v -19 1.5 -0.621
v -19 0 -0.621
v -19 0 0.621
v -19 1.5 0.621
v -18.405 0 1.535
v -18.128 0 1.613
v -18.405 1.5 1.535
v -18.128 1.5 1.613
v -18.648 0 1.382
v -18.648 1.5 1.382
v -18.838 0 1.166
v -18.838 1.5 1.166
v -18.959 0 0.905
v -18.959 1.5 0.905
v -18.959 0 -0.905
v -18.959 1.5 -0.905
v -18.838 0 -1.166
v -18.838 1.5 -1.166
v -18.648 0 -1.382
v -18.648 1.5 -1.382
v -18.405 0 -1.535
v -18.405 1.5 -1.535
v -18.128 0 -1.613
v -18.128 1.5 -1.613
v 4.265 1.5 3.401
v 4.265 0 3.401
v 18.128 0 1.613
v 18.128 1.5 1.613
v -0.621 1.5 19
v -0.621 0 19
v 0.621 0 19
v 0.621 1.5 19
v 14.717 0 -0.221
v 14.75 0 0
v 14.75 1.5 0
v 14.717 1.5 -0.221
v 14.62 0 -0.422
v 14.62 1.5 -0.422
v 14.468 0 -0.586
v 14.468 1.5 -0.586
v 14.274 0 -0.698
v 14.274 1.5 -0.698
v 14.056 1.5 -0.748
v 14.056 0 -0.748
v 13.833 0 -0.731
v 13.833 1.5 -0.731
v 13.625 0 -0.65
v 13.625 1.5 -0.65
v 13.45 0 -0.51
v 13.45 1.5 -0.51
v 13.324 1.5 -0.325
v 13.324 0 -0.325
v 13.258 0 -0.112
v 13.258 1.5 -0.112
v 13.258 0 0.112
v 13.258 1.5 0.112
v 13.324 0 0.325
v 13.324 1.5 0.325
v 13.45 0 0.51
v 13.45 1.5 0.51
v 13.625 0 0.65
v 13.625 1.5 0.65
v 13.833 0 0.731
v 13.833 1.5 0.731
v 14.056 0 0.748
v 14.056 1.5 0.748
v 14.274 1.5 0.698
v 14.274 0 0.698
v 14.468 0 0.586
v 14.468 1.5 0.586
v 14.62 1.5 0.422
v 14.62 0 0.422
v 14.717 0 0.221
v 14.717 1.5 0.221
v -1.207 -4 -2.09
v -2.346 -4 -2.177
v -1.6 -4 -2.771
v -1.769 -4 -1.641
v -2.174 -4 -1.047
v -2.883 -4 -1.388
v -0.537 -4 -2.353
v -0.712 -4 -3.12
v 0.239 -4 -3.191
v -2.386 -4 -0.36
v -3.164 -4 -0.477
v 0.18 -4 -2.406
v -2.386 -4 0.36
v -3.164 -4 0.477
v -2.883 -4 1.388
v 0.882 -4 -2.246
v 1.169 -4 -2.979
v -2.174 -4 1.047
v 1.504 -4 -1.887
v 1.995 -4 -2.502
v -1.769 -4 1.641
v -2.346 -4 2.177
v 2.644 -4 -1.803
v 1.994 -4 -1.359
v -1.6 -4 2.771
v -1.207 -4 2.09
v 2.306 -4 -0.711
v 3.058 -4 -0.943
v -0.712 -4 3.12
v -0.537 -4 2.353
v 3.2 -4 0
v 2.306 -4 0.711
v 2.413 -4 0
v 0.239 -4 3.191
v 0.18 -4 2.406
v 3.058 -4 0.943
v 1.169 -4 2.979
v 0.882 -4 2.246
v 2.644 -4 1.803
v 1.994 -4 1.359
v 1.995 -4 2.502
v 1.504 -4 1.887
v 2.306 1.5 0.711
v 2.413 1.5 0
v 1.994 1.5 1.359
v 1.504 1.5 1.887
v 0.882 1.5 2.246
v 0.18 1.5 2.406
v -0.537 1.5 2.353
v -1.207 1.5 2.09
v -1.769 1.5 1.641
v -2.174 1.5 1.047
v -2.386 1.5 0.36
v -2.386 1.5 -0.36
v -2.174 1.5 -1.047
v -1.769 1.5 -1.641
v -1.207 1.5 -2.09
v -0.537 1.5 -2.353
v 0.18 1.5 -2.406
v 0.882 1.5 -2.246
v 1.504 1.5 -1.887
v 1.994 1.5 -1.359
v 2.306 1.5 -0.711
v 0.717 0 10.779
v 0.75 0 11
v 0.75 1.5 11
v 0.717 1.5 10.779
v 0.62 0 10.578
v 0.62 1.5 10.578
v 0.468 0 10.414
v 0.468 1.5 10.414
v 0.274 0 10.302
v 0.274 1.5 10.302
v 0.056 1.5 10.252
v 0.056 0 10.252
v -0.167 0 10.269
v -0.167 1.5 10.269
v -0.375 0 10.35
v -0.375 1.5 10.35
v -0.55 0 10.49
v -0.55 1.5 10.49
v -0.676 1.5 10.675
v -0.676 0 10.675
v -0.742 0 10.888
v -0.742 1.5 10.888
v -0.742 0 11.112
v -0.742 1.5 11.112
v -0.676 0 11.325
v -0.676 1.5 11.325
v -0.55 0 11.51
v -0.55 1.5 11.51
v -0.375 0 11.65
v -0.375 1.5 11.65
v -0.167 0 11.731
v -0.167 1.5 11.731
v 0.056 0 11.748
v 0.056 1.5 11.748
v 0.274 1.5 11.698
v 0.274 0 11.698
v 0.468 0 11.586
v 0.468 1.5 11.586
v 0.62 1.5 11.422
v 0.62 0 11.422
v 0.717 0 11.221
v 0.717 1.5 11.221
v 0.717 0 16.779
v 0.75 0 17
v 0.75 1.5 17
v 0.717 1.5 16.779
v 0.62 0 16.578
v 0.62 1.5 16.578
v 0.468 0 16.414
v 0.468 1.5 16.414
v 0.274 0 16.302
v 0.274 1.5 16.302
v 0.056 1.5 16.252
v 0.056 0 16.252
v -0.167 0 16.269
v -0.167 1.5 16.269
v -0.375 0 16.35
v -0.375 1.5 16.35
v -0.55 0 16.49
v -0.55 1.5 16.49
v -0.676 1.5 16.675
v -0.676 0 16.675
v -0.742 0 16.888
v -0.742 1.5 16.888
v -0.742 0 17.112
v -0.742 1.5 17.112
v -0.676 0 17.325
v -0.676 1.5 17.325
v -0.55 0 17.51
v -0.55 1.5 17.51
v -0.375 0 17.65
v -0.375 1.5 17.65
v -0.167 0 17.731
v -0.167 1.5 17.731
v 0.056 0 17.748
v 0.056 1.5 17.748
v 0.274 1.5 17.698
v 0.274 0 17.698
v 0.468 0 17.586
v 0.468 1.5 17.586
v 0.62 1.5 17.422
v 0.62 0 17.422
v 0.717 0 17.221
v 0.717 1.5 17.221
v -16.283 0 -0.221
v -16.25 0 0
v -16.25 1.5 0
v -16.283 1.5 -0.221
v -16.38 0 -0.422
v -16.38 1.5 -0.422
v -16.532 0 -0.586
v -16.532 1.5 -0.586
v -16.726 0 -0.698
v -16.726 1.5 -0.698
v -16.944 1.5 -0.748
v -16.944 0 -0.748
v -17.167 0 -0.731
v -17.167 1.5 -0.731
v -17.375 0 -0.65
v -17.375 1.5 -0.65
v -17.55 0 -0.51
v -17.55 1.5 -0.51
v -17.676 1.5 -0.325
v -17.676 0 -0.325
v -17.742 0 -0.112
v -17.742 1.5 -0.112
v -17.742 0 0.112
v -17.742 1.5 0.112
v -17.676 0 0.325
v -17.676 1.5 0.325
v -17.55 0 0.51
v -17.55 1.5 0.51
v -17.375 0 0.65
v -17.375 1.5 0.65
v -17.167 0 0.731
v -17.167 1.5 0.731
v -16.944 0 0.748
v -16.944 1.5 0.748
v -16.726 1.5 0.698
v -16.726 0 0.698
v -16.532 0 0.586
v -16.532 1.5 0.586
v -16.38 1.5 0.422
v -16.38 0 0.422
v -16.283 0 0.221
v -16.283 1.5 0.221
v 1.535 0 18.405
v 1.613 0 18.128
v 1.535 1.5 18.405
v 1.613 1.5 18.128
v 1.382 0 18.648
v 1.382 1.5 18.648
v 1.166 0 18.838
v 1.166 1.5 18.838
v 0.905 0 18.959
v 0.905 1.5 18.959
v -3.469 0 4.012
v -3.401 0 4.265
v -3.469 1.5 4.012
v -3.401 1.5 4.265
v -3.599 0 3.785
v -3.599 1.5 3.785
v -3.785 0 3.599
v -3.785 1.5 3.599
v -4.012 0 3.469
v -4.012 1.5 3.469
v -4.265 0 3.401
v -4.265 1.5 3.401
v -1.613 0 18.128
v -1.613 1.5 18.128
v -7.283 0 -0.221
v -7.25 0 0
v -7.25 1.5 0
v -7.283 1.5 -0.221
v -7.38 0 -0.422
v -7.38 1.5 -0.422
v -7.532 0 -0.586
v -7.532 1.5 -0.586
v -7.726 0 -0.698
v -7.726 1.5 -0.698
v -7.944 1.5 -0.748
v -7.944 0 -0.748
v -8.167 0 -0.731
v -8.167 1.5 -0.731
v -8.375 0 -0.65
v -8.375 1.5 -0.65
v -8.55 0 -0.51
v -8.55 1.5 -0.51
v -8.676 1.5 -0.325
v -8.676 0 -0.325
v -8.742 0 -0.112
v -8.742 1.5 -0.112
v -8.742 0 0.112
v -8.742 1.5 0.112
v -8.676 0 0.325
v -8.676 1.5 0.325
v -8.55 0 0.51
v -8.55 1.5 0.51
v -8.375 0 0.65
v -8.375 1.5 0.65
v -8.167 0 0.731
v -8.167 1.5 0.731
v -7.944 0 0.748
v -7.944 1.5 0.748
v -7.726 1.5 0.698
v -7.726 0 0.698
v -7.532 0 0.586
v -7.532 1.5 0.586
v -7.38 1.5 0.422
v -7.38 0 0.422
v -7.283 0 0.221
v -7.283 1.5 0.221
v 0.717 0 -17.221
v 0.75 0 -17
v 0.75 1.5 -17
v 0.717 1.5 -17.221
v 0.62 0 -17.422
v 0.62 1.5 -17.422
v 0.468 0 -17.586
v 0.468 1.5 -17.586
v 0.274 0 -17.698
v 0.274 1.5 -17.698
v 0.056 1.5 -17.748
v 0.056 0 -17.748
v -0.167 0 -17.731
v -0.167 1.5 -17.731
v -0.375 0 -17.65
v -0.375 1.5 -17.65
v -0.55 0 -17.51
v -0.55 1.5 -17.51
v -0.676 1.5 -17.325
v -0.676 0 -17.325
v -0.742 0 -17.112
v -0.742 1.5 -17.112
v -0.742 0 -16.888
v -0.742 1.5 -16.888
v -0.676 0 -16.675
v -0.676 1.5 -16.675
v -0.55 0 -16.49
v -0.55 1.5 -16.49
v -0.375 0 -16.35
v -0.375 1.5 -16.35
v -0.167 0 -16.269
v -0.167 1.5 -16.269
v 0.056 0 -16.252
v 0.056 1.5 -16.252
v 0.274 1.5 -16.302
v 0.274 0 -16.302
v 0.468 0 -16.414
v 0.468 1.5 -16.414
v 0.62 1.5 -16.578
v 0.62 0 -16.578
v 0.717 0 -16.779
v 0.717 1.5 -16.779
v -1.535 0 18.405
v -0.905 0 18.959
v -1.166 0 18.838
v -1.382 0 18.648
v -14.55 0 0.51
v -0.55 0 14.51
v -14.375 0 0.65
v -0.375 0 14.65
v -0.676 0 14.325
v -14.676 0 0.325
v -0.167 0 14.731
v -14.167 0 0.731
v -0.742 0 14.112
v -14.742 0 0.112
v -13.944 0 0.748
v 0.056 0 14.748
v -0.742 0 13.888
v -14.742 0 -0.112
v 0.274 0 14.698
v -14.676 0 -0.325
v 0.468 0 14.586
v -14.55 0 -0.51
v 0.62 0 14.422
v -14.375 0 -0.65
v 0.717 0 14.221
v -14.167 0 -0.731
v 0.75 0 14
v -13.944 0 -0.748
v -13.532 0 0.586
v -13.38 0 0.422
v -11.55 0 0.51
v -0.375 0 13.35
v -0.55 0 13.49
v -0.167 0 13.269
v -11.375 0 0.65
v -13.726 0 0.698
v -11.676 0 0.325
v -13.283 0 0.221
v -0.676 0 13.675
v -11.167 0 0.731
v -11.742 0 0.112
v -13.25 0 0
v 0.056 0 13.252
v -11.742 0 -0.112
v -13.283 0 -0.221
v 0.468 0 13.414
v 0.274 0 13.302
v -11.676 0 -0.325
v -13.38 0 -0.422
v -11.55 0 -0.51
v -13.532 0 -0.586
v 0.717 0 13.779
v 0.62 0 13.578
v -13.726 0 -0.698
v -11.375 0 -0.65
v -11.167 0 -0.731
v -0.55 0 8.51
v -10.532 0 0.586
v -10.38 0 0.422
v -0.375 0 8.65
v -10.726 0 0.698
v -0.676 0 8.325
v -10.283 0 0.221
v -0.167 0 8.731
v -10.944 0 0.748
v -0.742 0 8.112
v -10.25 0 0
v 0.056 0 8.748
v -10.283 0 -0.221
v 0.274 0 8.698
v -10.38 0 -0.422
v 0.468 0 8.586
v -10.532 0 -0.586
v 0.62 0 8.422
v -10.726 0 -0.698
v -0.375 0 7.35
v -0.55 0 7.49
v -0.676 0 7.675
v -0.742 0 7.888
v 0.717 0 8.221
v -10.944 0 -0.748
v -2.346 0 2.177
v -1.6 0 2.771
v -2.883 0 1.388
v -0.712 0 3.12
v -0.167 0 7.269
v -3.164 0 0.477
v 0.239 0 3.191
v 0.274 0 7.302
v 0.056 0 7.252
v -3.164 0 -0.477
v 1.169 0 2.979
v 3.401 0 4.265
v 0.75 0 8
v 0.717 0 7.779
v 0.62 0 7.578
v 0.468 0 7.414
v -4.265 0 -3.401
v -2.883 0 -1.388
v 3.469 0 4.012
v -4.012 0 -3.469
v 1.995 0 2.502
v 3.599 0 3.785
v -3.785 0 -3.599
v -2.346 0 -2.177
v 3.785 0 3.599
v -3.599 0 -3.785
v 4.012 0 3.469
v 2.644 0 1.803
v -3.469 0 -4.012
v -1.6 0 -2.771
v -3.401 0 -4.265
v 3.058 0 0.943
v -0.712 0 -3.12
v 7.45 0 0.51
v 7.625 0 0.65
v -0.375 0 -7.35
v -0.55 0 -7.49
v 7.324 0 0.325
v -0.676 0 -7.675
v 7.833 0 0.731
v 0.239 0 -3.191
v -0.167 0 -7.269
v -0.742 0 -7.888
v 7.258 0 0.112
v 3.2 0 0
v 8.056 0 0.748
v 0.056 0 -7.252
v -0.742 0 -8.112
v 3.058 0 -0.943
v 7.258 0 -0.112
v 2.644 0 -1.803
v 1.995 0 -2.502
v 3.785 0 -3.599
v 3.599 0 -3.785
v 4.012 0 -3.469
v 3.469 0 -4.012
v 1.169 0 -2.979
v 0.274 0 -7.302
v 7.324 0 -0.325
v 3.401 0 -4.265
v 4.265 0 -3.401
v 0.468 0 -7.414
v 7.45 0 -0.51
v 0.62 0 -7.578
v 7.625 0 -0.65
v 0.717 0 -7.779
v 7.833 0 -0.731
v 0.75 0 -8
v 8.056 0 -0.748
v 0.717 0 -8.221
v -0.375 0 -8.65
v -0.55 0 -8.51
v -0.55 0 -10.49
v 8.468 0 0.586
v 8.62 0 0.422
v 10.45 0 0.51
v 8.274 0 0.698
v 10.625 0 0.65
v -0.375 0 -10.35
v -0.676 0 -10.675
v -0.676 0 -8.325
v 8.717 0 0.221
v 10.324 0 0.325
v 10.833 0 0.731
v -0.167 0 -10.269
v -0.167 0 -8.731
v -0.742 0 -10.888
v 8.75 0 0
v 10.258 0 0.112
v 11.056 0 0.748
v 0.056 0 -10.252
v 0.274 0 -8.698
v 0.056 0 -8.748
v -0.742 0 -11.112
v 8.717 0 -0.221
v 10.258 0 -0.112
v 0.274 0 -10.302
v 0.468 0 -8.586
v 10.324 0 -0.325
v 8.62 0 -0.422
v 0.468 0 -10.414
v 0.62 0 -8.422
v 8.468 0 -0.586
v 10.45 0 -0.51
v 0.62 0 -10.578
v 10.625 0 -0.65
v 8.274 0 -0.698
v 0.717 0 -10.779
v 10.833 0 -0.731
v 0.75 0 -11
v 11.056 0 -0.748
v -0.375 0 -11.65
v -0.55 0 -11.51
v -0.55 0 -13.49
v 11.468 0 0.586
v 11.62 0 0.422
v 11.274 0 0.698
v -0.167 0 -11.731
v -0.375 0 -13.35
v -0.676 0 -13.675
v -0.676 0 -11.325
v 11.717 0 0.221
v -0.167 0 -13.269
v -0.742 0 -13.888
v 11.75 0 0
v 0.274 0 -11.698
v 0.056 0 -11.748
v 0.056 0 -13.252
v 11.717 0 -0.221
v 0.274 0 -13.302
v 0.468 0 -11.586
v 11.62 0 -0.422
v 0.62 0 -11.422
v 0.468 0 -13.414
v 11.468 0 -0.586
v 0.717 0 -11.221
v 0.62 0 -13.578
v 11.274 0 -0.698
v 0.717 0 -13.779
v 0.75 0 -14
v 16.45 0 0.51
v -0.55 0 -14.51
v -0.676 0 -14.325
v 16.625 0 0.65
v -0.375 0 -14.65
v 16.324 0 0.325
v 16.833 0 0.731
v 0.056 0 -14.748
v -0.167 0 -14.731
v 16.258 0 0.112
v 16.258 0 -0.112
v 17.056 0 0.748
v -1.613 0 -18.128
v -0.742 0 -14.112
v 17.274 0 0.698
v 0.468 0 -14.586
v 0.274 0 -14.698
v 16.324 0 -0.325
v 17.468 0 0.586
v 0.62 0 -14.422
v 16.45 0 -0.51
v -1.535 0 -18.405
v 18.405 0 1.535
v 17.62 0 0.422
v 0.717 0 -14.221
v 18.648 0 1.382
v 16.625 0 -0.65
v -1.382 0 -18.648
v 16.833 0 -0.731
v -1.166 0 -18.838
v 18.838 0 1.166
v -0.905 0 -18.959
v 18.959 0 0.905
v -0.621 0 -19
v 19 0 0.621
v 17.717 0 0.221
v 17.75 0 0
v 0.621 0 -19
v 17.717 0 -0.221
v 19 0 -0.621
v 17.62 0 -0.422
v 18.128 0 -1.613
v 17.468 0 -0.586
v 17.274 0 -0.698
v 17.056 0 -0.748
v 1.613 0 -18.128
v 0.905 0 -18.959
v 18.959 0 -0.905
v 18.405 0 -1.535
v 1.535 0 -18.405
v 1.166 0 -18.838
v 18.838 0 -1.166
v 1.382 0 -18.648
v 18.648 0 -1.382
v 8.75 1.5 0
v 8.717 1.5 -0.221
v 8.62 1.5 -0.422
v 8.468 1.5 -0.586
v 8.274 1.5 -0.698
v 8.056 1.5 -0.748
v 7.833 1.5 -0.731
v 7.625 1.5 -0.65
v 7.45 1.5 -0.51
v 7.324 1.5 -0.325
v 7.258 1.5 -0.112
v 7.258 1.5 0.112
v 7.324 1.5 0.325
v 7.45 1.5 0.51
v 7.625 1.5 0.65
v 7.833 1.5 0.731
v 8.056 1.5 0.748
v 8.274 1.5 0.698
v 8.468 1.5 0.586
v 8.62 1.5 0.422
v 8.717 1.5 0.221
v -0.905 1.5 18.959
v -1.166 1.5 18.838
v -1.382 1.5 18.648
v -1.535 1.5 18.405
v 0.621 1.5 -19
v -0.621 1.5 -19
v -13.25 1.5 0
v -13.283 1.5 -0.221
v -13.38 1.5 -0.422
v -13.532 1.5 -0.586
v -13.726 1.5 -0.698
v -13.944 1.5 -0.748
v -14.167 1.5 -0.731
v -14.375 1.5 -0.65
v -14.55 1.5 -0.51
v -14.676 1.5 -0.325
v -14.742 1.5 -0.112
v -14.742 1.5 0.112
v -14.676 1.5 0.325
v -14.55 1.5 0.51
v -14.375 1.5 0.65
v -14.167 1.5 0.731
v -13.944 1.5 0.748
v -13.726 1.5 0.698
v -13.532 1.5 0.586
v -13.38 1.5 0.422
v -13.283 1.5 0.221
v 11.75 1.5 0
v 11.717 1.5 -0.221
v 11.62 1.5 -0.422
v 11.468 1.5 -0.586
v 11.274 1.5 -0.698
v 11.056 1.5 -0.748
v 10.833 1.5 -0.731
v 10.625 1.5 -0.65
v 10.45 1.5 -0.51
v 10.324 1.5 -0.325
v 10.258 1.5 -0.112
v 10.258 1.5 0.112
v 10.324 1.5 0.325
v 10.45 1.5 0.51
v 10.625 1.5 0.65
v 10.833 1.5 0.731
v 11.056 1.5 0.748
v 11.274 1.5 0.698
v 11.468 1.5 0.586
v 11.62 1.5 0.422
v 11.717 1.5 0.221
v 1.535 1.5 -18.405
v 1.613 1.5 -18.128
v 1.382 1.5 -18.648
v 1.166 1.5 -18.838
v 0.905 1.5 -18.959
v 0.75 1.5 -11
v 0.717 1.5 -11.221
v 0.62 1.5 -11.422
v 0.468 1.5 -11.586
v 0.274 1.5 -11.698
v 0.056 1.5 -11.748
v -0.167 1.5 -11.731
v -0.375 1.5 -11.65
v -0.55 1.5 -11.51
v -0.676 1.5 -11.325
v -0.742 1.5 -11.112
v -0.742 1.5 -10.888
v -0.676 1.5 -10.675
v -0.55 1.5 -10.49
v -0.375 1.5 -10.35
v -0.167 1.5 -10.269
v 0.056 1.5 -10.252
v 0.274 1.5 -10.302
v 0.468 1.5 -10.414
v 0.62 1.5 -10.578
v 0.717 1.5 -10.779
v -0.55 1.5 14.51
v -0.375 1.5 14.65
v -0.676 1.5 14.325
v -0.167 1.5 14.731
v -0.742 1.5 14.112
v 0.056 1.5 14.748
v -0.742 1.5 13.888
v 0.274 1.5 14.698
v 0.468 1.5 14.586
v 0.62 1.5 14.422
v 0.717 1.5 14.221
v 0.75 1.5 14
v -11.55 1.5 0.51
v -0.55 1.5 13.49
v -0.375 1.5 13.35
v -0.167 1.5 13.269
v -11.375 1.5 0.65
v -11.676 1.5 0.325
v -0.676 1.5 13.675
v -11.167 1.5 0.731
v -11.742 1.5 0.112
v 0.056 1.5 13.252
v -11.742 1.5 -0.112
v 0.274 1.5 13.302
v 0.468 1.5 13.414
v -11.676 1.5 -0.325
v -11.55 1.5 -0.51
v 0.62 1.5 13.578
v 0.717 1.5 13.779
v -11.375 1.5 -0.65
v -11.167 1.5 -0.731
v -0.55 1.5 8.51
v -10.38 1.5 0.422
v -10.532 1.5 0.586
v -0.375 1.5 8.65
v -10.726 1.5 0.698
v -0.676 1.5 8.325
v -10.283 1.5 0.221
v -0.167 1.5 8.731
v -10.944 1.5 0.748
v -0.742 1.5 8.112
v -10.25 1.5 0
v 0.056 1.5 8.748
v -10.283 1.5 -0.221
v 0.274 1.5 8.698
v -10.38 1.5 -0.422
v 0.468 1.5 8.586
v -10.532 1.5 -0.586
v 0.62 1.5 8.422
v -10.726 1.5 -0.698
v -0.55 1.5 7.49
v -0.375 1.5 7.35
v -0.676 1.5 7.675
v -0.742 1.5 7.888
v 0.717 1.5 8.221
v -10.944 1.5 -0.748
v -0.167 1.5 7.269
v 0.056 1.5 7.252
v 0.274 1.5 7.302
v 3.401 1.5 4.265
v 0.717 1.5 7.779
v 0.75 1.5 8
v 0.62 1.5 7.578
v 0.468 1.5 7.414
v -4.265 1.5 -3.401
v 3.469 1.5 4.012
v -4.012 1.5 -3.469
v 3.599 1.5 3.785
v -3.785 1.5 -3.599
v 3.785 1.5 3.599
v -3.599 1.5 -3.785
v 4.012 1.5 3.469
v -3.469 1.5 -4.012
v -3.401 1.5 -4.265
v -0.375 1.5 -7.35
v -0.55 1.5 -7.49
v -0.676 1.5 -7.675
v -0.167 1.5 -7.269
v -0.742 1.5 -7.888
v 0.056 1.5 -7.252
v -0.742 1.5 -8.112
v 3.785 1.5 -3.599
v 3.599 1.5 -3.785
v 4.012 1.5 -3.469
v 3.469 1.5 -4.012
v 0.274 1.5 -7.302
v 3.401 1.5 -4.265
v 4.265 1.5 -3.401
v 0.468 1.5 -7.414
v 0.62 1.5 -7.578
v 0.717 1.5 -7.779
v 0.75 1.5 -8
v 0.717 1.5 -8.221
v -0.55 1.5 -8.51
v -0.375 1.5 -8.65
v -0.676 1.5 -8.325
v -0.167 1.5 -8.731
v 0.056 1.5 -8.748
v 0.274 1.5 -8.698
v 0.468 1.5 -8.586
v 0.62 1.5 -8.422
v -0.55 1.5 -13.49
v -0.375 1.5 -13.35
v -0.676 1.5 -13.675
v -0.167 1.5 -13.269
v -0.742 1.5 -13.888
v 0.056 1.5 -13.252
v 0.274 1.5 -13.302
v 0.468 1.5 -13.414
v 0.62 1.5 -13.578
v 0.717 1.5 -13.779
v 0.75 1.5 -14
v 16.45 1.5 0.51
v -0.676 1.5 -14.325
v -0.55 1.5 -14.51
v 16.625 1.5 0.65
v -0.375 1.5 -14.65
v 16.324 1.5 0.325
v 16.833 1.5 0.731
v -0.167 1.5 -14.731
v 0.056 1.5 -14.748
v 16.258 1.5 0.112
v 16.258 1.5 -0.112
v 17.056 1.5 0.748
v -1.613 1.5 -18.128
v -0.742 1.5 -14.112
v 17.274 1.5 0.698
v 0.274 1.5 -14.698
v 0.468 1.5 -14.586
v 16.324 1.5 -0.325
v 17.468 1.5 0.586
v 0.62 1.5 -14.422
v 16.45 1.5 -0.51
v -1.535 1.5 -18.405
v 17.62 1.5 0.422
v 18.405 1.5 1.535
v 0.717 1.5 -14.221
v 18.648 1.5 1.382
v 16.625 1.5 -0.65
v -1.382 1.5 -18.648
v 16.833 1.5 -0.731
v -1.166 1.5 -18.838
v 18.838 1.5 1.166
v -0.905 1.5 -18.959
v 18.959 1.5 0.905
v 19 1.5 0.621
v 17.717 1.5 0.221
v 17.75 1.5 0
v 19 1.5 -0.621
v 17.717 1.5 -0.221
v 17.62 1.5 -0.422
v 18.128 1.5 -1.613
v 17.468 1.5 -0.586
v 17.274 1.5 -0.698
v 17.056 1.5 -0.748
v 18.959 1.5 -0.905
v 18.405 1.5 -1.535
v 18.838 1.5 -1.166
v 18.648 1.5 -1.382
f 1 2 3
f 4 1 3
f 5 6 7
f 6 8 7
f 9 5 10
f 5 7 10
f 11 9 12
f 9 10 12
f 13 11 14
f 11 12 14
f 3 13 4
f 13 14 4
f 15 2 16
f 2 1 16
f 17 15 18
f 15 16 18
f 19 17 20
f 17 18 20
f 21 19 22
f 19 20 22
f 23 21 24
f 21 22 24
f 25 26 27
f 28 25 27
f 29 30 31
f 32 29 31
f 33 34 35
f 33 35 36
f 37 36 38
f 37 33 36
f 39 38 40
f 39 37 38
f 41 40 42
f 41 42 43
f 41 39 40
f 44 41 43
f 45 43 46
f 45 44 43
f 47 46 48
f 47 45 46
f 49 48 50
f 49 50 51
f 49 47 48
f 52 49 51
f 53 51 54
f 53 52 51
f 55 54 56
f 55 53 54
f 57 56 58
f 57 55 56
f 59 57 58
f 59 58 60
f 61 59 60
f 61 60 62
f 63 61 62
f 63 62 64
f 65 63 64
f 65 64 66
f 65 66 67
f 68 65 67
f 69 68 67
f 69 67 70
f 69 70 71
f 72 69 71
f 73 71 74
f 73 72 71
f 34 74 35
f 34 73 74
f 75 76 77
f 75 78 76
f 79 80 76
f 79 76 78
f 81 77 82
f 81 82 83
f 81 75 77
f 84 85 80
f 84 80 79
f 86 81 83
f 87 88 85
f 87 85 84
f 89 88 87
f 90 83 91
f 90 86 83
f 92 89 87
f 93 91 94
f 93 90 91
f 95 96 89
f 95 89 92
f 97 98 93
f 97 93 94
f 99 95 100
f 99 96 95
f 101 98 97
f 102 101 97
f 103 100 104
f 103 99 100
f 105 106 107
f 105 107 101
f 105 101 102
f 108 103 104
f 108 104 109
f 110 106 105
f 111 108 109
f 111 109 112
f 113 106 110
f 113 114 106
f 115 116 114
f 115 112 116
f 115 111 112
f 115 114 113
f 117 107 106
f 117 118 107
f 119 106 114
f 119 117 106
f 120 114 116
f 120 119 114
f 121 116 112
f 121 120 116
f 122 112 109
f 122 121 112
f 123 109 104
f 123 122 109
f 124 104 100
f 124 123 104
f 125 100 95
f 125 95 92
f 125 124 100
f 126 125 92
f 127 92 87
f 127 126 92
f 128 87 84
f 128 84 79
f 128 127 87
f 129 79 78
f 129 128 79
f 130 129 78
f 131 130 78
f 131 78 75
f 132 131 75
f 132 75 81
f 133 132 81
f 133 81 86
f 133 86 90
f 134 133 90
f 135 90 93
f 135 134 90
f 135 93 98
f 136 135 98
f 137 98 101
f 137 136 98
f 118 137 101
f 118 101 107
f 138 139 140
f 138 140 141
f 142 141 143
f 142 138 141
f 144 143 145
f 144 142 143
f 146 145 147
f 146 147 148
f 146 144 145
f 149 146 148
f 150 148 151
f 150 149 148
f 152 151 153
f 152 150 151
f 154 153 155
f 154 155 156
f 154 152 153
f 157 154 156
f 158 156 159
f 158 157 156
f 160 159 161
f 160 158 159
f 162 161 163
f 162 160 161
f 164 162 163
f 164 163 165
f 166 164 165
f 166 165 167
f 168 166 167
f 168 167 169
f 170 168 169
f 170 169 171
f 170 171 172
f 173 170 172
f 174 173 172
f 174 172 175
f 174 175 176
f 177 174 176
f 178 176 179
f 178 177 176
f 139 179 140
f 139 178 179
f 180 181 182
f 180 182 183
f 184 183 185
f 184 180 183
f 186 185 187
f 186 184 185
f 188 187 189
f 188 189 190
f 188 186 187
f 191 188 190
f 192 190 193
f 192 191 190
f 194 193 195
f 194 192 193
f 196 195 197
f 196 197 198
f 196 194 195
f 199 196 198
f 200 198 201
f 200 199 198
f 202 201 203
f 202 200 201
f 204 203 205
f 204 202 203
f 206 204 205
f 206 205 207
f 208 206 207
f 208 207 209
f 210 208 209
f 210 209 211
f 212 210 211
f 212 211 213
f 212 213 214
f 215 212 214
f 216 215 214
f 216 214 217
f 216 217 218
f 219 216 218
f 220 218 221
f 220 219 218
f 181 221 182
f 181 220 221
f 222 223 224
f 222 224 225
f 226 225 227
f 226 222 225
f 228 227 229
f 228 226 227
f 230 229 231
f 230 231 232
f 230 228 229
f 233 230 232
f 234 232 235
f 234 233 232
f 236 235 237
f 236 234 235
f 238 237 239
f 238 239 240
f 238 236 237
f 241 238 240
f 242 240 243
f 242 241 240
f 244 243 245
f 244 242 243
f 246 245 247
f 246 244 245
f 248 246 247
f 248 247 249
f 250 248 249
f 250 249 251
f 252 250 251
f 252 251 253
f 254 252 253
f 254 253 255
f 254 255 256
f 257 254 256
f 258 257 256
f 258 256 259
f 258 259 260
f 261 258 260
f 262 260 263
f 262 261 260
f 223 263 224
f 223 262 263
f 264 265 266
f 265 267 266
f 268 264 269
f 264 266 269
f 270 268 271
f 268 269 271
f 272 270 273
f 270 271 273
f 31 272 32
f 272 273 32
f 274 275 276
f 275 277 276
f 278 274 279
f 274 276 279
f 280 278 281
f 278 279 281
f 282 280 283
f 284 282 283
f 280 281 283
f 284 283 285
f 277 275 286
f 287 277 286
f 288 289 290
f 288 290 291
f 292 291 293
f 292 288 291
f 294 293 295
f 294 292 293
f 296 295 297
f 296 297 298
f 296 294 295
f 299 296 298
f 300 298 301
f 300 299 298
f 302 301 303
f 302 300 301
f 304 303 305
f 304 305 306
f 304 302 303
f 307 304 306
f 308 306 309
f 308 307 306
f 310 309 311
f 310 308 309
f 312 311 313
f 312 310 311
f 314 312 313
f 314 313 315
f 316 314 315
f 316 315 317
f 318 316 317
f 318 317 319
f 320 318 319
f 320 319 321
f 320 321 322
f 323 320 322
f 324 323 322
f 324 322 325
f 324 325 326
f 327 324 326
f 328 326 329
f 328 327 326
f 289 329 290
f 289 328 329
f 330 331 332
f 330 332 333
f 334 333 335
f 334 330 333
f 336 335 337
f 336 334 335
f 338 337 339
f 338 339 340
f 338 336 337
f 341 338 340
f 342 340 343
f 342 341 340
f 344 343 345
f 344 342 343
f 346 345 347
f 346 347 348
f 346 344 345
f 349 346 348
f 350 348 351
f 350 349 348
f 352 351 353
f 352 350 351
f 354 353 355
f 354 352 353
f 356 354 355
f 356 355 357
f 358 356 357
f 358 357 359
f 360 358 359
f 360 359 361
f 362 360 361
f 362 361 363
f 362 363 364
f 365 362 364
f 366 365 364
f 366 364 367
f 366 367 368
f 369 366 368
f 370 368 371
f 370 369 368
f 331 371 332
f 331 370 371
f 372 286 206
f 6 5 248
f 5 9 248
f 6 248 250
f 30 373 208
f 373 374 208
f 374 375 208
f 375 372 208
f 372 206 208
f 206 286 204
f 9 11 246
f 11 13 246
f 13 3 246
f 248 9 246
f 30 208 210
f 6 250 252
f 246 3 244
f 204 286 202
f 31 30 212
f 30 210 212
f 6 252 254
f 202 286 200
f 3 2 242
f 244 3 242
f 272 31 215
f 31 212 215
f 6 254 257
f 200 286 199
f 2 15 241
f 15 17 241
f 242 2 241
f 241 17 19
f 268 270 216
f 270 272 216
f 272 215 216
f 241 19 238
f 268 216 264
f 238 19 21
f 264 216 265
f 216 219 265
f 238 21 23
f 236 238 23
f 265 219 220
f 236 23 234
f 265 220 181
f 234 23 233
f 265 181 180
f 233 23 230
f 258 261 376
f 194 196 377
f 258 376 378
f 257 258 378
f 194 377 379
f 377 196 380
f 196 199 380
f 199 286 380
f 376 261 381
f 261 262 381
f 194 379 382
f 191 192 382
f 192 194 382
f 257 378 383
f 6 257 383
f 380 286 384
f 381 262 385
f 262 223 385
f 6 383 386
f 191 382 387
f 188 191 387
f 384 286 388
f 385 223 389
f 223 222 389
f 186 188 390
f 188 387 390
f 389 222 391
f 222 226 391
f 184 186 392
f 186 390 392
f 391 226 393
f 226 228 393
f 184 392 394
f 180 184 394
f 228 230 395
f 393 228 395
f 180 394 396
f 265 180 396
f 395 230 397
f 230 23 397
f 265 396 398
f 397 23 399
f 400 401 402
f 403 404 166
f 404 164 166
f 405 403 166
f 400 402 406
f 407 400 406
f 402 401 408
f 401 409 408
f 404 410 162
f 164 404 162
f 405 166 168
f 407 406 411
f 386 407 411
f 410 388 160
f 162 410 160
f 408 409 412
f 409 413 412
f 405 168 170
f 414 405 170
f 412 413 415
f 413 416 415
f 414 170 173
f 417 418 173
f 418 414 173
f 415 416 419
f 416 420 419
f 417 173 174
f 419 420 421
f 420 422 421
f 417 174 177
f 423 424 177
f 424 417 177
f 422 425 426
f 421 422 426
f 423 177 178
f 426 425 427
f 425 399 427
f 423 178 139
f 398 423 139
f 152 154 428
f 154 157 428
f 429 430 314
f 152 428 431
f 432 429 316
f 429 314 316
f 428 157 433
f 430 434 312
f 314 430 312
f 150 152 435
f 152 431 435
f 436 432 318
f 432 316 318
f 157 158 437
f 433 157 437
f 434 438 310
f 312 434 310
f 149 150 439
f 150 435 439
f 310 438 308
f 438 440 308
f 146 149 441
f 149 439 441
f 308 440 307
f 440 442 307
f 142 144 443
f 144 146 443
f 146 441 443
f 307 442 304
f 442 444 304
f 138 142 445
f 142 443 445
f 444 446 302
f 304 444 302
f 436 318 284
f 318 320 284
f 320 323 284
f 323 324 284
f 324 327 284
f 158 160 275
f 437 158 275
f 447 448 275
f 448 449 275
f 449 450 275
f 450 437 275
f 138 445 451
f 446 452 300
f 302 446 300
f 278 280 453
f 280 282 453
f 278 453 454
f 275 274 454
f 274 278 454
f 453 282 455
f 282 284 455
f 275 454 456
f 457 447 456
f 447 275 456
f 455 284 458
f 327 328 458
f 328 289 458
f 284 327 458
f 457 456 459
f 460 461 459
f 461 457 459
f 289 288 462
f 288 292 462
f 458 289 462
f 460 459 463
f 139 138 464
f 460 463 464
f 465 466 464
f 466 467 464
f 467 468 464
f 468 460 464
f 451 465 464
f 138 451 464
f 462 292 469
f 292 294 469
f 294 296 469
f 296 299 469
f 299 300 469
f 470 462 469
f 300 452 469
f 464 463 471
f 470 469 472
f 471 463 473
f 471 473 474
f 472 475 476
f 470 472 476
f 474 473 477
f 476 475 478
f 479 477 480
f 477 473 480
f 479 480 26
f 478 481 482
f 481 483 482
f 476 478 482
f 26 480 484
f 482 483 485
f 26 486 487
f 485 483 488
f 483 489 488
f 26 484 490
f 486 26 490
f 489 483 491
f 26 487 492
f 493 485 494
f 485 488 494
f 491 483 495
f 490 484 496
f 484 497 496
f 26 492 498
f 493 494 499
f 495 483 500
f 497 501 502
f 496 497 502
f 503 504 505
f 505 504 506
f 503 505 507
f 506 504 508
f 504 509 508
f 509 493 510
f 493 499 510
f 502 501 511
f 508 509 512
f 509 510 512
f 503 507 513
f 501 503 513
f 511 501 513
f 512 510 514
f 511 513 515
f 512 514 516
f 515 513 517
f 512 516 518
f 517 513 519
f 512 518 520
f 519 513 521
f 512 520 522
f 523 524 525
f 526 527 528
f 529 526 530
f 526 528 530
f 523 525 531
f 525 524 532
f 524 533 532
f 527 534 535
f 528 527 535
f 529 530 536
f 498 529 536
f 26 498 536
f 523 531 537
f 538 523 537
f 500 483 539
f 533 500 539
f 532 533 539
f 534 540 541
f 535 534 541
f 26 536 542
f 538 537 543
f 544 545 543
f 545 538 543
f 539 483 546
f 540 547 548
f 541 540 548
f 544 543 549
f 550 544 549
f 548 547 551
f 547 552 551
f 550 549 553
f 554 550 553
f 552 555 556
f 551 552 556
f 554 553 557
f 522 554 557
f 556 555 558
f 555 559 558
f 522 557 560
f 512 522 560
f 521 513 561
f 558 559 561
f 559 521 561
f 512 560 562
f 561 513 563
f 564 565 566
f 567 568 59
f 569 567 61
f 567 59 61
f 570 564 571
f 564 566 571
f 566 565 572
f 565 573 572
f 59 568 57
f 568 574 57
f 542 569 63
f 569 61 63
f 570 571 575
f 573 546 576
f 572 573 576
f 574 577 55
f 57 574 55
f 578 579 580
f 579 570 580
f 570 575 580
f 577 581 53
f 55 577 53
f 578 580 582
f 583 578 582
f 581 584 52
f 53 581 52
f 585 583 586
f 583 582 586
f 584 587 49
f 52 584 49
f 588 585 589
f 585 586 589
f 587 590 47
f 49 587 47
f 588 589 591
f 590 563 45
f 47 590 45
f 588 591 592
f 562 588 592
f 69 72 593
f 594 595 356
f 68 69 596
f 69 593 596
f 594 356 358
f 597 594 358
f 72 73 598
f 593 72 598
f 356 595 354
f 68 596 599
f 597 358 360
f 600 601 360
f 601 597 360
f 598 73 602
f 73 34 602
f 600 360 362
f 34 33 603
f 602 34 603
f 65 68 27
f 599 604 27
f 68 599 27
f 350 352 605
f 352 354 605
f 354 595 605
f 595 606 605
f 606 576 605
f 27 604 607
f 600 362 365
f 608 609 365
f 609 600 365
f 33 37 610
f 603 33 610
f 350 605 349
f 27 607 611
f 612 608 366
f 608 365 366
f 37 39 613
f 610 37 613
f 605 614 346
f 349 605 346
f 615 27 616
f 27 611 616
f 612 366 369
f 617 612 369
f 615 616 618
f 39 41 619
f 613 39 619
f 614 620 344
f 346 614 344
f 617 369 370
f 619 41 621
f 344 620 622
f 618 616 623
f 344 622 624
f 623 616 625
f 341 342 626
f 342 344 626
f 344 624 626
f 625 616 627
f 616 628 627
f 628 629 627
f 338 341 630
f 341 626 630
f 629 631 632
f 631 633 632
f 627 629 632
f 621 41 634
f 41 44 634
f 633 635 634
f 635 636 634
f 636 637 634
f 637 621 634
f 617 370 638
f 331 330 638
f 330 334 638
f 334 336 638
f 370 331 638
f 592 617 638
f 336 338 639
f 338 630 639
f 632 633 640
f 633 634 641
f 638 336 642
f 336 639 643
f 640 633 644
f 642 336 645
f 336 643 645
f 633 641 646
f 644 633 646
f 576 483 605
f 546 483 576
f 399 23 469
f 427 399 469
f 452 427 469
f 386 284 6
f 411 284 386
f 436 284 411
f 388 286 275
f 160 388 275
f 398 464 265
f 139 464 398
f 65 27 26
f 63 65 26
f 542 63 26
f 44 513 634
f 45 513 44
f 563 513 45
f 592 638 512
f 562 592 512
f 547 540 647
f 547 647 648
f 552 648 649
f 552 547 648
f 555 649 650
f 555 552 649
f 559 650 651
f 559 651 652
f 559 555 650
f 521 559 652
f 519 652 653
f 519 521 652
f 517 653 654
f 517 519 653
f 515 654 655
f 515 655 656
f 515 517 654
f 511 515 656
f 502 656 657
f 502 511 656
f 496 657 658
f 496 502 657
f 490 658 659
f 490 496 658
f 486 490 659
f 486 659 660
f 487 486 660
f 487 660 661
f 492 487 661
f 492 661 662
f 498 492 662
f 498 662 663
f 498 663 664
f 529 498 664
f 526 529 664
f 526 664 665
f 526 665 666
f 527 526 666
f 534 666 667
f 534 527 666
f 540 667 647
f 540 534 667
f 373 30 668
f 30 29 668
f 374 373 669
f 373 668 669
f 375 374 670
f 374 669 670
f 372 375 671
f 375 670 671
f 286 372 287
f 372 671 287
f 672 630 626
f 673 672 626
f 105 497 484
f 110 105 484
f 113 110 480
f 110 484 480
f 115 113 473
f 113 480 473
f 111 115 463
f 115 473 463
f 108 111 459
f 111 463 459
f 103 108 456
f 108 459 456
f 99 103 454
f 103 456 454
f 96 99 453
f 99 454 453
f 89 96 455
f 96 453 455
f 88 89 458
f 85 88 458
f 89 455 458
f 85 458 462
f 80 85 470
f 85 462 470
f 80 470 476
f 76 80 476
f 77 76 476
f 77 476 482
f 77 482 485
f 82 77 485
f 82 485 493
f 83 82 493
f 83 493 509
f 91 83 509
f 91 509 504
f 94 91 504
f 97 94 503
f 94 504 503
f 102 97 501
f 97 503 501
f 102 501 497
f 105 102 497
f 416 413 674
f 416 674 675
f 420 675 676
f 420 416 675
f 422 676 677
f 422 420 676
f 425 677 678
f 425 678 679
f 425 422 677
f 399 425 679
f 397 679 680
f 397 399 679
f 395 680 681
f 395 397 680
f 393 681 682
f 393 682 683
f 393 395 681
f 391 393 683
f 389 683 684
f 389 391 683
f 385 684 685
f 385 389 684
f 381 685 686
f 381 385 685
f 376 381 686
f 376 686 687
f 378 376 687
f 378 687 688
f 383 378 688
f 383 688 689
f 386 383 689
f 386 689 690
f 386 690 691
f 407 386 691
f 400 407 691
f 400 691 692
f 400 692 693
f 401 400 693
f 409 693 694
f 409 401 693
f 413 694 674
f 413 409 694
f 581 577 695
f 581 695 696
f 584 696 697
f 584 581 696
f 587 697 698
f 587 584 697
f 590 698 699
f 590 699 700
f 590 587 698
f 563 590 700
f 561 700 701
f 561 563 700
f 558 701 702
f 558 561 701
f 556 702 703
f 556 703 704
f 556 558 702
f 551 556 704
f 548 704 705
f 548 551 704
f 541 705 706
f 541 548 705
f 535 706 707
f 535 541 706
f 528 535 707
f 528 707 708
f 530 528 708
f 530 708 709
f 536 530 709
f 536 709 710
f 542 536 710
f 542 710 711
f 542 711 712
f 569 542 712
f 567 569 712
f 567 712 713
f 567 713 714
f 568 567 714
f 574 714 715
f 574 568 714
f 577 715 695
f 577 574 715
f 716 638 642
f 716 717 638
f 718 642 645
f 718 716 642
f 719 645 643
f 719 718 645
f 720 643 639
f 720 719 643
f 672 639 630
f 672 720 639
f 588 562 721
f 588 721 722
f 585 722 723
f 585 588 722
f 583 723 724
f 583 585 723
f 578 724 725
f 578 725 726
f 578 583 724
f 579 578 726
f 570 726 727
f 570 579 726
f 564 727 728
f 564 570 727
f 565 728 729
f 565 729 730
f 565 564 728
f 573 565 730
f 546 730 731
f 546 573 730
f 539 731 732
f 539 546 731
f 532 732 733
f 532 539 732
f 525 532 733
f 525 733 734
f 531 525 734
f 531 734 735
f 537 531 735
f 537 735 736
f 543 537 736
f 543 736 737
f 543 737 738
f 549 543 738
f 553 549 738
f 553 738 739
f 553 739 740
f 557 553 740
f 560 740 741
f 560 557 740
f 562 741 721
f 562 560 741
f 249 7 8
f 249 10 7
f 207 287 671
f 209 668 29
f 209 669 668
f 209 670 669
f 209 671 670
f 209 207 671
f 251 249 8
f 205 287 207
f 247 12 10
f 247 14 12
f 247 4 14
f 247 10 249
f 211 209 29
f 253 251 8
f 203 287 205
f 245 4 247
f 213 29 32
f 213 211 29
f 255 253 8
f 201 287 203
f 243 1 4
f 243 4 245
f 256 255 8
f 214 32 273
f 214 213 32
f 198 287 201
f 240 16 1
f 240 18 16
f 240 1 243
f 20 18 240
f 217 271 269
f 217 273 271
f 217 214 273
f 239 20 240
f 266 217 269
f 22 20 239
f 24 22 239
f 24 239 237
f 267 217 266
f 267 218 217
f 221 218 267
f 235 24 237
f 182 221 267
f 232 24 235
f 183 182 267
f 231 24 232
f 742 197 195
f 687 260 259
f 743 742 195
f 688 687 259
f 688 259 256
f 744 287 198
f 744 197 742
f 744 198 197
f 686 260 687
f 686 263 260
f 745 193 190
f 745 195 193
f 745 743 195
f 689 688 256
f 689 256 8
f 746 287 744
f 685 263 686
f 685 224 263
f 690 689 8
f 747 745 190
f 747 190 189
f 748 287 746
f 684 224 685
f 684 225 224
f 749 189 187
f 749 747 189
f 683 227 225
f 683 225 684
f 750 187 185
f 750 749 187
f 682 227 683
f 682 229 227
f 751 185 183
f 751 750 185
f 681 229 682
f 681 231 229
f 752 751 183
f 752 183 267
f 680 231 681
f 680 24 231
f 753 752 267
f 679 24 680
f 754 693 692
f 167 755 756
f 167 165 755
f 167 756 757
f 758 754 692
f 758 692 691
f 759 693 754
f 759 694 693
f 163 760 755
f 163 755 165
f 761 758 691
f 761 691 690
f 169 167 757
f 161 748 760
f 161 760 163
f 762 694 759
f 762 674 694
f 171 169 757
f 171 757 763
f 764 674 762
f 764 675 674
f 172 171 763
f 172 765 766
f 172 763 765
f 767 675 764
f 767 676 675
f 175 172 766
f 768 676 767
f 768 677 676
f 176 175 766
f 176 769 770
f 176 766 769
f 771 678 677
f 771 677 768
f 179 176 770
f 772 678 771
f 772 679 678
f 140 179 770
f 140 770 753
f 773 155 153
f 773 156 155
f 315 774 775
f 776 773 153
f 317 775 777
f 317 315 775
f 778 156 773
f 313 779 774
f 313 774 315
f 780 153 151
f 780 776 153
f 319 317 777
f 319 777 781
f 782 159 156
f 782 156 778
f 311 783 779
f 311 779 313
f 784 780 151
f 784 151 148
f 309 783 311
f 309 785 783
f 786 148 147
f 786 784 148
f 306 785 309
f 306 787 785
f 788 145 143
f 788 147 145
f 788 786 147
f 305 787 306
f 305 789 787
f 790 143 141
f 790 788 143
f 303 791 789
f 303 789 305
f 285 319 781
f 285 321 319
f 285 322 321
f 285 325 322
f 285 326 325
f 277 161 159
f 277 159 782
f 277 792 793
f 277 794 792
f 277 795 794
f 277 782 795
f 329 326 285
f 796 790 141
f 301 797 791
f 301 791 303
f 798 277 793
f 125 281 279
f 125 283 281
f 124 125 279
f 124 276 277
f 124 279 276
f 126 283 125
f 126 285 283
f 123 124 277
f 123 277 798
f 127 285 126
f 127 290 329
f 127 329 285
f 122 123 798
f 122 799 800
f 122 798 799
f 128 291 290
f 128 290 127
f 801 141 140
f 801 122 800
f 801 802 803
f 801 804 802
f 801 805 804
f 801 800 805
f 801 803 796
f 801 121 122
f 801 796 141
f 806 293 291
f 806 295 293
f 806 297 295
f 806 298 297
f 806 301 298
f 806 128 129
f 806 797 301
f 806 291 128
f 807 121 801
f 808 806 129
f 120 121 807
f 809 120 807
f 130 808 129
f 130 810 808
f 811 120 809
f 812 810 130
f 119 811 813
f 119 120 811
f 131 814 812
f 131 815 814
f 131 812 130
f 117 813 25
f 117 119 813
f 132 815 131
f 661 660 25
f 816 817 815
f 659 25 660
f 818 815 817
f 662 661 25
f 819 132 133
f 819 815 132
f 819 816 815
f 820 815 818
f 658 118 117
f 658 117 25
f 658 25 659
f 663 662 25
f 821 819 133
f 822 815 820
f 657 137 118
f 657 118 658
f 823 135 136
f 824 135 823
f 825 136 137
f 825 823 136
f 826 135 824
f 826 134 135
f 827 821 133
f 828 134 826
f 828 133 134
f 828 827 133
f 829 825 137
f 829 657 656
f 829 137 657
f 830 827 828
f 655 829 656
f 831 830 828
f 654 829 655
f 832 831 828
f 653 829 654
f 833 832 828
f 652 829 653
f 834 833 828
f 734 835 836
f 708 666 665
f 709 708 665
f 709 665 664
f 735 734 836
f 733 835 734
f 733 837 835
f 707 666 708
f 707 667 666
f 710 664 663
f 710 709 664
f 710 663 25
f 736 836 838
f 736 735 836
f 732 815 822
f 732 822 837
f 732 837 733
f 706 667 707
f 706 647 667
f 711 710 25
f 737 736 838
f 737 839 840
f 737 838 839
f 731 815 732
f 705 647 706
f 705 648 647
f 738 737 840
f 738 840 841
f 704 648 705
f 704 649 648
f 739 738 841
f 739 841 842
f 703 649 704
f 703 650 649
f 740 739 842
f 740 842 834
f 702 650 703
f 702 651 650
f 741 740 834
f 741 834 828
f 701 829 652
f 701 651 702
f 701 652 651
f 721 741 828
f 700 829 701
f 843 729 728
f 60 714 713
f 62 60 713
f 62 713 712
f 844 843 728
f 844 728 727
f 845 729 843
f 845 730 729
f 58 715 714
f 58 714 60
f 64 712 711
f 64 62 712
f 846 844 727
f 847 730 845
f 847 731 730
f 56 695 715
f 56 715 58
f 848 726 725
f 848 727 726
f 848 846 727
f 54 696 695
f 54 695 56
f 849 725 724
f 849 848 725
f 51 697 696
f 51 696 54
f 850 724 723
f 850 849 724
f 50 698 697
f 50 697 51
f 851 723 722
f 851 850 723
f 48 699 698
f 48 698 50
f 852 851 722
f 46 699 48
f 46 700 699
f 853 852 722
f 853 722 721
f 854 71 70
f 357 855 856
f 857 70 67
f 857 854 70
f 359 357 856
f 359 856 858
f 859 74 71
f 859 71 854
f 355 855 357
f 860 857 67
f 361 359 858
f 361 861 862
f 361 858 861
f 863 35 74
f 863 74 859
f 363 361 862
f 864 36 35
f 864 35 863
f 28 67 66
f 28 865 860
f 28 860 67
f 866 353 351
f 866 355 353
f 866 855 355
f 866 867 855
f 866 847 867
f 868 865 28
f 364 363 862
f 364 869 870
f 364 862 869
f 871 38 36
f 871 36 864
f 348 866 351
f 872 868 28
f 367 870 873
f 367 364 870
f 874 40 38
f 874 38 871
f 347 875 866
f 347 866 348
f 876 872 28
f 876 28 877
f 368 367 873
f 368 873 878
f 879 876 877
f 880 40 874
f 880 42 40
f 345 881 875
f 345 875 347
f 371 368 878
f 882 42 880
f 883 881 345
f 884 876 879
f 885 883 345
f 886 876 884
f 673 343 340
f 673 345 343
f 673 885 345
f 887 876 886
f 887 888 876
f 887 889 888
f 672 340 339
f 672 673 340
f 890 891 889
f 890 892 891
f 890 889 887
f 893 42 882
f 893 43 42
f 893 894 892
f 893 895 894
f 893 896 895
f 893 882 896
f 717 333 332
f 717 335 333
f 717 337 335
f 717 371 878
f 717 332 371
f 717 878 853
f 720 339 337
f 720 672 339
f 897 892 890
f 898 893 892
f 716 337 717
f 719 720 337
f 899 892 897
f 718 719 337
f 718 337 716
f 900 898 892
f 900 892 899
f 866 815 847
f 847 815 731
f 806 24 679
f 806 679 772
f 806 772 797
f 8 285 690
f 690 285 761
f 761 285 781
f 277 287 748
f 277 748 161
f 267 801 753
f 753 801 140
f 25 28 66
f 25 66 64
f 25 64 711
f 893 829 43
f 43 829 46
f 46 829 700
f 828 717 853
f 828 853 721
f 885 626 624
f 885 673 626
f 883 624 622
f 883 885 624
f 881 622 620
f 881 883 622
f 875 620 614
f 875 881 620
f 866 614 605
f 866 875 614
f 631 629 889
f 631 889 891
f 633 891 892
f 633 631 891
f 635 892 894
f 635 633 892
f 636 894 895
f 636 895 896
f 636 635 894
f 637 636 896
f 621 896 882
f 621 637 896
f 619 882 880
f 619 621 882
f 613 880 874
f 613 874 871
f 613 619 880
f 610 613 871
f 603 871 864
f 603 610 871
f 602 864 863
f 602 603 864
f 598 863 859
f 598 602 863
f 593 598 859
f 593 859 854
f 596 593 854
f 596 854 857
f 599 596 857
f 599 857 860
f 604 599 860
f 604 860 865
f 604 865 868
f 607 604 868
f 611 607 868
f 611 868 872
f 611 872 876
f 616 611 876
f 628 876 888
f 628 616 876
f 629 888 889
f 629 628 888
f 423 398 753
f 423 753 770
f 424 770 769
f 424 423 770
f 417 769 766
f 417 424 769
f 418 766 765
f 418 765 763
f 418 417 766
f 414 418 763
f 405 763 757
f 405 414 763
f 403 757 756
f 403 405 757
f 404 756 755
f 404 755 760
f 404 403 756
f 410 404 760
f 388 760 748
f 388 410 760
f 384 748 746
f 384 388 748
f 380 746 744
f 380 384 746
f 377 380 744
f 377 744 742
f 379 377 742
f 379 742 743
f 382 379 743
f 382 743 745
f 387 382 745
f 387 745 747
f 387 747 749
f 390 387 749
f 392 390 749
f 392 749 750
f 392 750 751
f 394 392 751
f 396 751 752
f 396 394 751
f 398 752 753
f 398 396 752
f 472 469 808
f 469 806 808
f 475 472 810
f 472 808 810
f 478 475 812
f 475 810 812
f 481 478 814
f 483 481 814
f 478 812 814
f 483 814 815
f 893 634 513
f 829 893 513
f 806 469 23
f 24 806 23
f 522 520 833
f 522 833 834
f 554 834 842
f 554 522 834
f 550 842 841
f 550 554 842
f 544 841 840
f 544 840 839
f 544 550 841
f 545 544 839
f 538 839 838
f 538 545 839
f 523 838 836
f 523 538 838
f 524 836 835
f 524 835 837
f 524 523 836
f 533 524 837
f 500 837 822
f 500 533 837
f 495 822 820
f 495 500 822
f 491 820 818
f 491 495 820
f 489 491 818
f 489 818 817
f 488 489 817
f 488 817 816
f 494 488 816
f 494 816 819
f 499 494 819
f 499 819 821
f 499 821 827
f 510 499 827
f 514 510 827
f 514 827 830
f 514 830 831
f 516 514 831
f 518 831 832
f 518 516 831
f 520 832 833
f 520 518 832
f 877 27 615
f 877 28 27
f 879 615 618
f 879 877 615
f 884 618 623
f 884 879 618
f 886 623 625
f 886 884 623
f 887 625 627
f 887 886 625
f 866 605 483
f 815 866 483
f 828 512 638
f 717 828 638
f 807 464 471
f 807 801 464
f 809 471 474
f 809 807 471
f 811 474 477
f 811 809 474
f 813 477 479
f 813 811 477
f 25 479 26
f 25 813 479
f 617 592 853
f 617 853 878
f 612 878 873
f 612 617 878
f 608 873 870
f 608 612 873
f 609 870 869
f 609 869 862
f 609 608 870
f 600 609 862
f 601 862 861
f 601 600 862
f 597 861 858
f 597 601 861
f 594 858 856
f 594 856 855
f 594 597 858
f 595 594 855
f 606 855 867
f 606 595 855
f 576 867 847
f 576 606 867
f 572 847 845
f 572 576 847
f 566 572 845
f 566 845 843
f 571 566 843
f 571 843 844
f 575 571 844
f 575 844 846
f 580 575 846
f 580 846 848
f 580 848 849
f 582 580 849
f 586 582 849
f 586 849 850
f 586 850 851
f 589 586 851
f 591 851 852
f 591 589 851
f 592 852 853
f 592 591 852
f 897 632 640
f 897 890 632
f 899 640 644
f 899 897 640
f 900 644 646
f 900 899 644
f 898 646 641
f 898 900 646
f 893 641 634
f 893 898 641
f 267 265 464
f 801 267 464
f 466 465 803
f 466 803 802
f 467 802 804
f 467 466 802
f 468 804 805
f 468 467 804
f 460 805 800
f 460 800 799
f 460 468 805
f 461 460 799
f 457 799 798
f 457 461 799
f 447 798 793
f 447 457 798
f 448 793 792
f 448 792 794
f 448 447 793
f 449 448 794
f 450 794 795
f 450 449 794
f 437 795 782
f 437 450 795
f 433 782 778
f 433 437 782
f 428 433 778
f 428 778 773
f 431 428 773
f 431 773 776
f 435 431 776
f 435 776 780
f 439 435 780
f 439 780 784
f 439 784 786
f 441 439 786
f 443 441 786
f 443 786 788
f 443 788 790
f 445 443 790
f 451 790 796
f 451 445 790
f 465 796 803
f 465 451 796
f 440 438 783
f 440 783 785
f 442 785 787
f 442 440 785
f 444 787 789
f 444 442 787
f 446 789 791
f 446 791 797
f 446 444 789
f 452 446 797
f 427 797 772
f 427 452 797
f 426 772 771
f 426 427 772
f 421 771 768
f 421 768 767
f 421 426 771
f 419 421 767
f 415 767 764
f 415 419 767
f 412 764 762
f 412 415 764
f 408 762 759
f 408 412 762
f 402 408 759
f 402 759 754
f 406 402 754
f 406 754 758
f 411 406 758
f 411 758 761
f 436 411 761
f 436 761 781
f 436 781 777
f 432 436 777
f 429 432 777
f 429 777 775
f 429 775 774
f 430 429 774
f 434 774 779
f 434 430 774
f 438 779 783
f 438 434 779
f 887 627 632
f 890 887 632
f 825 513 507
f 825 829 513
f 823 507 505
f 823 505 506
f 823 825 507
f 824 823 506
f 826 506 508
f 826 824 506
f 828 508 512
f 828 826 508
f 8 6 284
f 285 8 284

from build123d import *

# Parameters (mm, degrees)
SKETCH1_R           = 2.413
SKETCH1_R_2         = 0.75
BOSS_EXTRUDE1_DEPTH = 1.5
SKETCH2_R           = 3.2
SKETCH2_R_2         = 2.413
BOSS_EXTRUDE2_DEPTH = 4
FILLET1_R           = 1


with BuildPart() as part:
    # Sketch1 → Boss-Extrude1 (new body)
    with BuildSketch(Plane(origin=(0, 0, 0), x_dir=(1, 0, 0), z_dir=(0, 1, 0))):
        Polygon((-1.5, 19), (-3.5, 3.5), (-19, 1.5), (-19, -1.5), (-3.5, -3.5), (-1.5, -19), (1.5, -19), (3.5, -3.5), (19, -1.5), (19, 1.5), (3.5, 3.5), (1.5, 19), align=None)
        Circle(SKETCH1_R, mode=Mode.SUBTRACT)
        with Locations((8, 0)):
            Circle(SKETCH1_R_2, mode=Mode.SUBTRACT)
        with Locations((11, 0)):
            Circle(SKETCH1_R_2, mode=Mode.SUBTRACT)
        with Locations((14, 0)):
            Circle(SKETCH1_R_2, mode=Mode.SUBTRACT)
        with Locations((17, 0)):
            Circle(SKETCH1_R_2, mode=Mode.SUBTRACT)
        with Locations((0, -8)):
            Circle(SKETCH1_R_2, mode=Mode.SUBTRACT)
        with Locations((0, -11)):
            Circle(SKETCH1_R_2, mode=Mode.SUBTRACT)
        with Locations((0, -14)):
            Circle(SKETCH1_R_2, mode=Mode.SUBTRACT)
        with Locations((0, -17)):
            Circle(SKETCH1_R_2, mode=Mode.SUBTRACT)
        with Locations((-8, 0)):
            Circle(SKETCH1_R_2, mode=Mode.SUBTRACT)
        with Locations((-11, 0)):
            Circle(SKETCH1_R_2, mode=Mode.SUBTRACT)
        with Locations((-14, 0)):
            Circle(SKETCH1_R_2, mode=Mode.SUBTRACT)
        with Locations((-17, 0)):
            Circle(SKETCH1_R_2, mode=Mode.SUBTRACT)
        with Locations((0, 8)):
            Circle(SKETCH1_R_2, mode=Mode.SUBTRACT)
        with Locations((0, 11)):
            Circle(SKETCH1_R_2, mode=Mode.SUBTRACT)
        with Locations((0, 14)):
            Circle(SKETCH1_R_2, mode=Mode.SUBTRACT)
        with Locations((0, 17)):
            Circle(SKETCH1_R_2, mode=Mode.SUBTRACT)
    extrude(amount=BOSS_EXTRUDE1_DEPTH)

    # Sketch2 → Boss-Extrude2 (add)
    with BuildSketch(Plane.XZ):
        Circle(SKETCH2_R)
        Circle(SKETCH2_R_2, mode=Mode.SUBTRACT)
    extrude(amount=BOSS_EXTRUDE2_DEPTH)

    # Fillet1
    fillet1_edges = [part.edges().sort_by_distance(p)[0] for p in [
        (-1.5, 0.75, 19),
        (-3.5, 0.75, 3.5),
        (-19, 0.75, 1.5),
        (-19, 0.75, -1.5),
        (-3.5, 0.75, -3.5),
        (-1.5, 0.75, -19),
        (1.5, 0.75, -19),
        (3.5, 0.75, -3.5),
        (19, 0.75, -1.5),
        (19, 0.75, 1.5),
        (3.5, 0.75, 3.5),
        (1.5, 0.75, 19),
    ]]
    fillet(fillet1_edges, radius=FILLET1_R)


solid = part.part
